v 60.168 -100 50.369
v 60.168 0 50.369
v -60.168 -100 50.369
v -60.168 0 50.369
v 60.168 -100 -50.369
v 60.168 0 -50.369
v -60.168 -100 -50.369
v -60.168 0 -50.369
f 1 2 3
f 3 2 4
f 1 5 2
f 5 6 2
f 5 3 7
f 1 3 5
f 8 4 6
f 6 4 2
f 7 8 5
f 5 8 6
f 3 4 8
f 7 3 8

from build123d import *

# Parameters (mm, degrees)
F2_DEPTH = 25
F3_DEPTH = 25
F4_DEPTH = 50


with BuildPart() as f2:
    # F1 (on face) → F2 (new body)
    with BuildSketch(Plane.XZ):
        Polygon((-60.1675212383, -50.3685362637), (60.1675212383, -50.3685362637), (60.1675212383, 50.3685362637), (-60.1675212383, 50.3685362637), (-60.1675212383, 50.0784505724), align=None)
    extrude(amount=F2_DEPTH)

    # F3 (add): a face of the model
    f3_faces = [f2.faces().sort_by_distance(p)[0] for p in [
        (0, -25, 0),
    ]]
    extrude(f3_faces, amount=F3_DEPTH)

    # F4 (add): a face of the model
    f4_faces = [f2.faces().sort_by_distance(p)[0] for p in [
        (0, -50, 0),
    ]]
    extrude(f4_faces, amount=F4_DEPTH)


solid = f2.part
